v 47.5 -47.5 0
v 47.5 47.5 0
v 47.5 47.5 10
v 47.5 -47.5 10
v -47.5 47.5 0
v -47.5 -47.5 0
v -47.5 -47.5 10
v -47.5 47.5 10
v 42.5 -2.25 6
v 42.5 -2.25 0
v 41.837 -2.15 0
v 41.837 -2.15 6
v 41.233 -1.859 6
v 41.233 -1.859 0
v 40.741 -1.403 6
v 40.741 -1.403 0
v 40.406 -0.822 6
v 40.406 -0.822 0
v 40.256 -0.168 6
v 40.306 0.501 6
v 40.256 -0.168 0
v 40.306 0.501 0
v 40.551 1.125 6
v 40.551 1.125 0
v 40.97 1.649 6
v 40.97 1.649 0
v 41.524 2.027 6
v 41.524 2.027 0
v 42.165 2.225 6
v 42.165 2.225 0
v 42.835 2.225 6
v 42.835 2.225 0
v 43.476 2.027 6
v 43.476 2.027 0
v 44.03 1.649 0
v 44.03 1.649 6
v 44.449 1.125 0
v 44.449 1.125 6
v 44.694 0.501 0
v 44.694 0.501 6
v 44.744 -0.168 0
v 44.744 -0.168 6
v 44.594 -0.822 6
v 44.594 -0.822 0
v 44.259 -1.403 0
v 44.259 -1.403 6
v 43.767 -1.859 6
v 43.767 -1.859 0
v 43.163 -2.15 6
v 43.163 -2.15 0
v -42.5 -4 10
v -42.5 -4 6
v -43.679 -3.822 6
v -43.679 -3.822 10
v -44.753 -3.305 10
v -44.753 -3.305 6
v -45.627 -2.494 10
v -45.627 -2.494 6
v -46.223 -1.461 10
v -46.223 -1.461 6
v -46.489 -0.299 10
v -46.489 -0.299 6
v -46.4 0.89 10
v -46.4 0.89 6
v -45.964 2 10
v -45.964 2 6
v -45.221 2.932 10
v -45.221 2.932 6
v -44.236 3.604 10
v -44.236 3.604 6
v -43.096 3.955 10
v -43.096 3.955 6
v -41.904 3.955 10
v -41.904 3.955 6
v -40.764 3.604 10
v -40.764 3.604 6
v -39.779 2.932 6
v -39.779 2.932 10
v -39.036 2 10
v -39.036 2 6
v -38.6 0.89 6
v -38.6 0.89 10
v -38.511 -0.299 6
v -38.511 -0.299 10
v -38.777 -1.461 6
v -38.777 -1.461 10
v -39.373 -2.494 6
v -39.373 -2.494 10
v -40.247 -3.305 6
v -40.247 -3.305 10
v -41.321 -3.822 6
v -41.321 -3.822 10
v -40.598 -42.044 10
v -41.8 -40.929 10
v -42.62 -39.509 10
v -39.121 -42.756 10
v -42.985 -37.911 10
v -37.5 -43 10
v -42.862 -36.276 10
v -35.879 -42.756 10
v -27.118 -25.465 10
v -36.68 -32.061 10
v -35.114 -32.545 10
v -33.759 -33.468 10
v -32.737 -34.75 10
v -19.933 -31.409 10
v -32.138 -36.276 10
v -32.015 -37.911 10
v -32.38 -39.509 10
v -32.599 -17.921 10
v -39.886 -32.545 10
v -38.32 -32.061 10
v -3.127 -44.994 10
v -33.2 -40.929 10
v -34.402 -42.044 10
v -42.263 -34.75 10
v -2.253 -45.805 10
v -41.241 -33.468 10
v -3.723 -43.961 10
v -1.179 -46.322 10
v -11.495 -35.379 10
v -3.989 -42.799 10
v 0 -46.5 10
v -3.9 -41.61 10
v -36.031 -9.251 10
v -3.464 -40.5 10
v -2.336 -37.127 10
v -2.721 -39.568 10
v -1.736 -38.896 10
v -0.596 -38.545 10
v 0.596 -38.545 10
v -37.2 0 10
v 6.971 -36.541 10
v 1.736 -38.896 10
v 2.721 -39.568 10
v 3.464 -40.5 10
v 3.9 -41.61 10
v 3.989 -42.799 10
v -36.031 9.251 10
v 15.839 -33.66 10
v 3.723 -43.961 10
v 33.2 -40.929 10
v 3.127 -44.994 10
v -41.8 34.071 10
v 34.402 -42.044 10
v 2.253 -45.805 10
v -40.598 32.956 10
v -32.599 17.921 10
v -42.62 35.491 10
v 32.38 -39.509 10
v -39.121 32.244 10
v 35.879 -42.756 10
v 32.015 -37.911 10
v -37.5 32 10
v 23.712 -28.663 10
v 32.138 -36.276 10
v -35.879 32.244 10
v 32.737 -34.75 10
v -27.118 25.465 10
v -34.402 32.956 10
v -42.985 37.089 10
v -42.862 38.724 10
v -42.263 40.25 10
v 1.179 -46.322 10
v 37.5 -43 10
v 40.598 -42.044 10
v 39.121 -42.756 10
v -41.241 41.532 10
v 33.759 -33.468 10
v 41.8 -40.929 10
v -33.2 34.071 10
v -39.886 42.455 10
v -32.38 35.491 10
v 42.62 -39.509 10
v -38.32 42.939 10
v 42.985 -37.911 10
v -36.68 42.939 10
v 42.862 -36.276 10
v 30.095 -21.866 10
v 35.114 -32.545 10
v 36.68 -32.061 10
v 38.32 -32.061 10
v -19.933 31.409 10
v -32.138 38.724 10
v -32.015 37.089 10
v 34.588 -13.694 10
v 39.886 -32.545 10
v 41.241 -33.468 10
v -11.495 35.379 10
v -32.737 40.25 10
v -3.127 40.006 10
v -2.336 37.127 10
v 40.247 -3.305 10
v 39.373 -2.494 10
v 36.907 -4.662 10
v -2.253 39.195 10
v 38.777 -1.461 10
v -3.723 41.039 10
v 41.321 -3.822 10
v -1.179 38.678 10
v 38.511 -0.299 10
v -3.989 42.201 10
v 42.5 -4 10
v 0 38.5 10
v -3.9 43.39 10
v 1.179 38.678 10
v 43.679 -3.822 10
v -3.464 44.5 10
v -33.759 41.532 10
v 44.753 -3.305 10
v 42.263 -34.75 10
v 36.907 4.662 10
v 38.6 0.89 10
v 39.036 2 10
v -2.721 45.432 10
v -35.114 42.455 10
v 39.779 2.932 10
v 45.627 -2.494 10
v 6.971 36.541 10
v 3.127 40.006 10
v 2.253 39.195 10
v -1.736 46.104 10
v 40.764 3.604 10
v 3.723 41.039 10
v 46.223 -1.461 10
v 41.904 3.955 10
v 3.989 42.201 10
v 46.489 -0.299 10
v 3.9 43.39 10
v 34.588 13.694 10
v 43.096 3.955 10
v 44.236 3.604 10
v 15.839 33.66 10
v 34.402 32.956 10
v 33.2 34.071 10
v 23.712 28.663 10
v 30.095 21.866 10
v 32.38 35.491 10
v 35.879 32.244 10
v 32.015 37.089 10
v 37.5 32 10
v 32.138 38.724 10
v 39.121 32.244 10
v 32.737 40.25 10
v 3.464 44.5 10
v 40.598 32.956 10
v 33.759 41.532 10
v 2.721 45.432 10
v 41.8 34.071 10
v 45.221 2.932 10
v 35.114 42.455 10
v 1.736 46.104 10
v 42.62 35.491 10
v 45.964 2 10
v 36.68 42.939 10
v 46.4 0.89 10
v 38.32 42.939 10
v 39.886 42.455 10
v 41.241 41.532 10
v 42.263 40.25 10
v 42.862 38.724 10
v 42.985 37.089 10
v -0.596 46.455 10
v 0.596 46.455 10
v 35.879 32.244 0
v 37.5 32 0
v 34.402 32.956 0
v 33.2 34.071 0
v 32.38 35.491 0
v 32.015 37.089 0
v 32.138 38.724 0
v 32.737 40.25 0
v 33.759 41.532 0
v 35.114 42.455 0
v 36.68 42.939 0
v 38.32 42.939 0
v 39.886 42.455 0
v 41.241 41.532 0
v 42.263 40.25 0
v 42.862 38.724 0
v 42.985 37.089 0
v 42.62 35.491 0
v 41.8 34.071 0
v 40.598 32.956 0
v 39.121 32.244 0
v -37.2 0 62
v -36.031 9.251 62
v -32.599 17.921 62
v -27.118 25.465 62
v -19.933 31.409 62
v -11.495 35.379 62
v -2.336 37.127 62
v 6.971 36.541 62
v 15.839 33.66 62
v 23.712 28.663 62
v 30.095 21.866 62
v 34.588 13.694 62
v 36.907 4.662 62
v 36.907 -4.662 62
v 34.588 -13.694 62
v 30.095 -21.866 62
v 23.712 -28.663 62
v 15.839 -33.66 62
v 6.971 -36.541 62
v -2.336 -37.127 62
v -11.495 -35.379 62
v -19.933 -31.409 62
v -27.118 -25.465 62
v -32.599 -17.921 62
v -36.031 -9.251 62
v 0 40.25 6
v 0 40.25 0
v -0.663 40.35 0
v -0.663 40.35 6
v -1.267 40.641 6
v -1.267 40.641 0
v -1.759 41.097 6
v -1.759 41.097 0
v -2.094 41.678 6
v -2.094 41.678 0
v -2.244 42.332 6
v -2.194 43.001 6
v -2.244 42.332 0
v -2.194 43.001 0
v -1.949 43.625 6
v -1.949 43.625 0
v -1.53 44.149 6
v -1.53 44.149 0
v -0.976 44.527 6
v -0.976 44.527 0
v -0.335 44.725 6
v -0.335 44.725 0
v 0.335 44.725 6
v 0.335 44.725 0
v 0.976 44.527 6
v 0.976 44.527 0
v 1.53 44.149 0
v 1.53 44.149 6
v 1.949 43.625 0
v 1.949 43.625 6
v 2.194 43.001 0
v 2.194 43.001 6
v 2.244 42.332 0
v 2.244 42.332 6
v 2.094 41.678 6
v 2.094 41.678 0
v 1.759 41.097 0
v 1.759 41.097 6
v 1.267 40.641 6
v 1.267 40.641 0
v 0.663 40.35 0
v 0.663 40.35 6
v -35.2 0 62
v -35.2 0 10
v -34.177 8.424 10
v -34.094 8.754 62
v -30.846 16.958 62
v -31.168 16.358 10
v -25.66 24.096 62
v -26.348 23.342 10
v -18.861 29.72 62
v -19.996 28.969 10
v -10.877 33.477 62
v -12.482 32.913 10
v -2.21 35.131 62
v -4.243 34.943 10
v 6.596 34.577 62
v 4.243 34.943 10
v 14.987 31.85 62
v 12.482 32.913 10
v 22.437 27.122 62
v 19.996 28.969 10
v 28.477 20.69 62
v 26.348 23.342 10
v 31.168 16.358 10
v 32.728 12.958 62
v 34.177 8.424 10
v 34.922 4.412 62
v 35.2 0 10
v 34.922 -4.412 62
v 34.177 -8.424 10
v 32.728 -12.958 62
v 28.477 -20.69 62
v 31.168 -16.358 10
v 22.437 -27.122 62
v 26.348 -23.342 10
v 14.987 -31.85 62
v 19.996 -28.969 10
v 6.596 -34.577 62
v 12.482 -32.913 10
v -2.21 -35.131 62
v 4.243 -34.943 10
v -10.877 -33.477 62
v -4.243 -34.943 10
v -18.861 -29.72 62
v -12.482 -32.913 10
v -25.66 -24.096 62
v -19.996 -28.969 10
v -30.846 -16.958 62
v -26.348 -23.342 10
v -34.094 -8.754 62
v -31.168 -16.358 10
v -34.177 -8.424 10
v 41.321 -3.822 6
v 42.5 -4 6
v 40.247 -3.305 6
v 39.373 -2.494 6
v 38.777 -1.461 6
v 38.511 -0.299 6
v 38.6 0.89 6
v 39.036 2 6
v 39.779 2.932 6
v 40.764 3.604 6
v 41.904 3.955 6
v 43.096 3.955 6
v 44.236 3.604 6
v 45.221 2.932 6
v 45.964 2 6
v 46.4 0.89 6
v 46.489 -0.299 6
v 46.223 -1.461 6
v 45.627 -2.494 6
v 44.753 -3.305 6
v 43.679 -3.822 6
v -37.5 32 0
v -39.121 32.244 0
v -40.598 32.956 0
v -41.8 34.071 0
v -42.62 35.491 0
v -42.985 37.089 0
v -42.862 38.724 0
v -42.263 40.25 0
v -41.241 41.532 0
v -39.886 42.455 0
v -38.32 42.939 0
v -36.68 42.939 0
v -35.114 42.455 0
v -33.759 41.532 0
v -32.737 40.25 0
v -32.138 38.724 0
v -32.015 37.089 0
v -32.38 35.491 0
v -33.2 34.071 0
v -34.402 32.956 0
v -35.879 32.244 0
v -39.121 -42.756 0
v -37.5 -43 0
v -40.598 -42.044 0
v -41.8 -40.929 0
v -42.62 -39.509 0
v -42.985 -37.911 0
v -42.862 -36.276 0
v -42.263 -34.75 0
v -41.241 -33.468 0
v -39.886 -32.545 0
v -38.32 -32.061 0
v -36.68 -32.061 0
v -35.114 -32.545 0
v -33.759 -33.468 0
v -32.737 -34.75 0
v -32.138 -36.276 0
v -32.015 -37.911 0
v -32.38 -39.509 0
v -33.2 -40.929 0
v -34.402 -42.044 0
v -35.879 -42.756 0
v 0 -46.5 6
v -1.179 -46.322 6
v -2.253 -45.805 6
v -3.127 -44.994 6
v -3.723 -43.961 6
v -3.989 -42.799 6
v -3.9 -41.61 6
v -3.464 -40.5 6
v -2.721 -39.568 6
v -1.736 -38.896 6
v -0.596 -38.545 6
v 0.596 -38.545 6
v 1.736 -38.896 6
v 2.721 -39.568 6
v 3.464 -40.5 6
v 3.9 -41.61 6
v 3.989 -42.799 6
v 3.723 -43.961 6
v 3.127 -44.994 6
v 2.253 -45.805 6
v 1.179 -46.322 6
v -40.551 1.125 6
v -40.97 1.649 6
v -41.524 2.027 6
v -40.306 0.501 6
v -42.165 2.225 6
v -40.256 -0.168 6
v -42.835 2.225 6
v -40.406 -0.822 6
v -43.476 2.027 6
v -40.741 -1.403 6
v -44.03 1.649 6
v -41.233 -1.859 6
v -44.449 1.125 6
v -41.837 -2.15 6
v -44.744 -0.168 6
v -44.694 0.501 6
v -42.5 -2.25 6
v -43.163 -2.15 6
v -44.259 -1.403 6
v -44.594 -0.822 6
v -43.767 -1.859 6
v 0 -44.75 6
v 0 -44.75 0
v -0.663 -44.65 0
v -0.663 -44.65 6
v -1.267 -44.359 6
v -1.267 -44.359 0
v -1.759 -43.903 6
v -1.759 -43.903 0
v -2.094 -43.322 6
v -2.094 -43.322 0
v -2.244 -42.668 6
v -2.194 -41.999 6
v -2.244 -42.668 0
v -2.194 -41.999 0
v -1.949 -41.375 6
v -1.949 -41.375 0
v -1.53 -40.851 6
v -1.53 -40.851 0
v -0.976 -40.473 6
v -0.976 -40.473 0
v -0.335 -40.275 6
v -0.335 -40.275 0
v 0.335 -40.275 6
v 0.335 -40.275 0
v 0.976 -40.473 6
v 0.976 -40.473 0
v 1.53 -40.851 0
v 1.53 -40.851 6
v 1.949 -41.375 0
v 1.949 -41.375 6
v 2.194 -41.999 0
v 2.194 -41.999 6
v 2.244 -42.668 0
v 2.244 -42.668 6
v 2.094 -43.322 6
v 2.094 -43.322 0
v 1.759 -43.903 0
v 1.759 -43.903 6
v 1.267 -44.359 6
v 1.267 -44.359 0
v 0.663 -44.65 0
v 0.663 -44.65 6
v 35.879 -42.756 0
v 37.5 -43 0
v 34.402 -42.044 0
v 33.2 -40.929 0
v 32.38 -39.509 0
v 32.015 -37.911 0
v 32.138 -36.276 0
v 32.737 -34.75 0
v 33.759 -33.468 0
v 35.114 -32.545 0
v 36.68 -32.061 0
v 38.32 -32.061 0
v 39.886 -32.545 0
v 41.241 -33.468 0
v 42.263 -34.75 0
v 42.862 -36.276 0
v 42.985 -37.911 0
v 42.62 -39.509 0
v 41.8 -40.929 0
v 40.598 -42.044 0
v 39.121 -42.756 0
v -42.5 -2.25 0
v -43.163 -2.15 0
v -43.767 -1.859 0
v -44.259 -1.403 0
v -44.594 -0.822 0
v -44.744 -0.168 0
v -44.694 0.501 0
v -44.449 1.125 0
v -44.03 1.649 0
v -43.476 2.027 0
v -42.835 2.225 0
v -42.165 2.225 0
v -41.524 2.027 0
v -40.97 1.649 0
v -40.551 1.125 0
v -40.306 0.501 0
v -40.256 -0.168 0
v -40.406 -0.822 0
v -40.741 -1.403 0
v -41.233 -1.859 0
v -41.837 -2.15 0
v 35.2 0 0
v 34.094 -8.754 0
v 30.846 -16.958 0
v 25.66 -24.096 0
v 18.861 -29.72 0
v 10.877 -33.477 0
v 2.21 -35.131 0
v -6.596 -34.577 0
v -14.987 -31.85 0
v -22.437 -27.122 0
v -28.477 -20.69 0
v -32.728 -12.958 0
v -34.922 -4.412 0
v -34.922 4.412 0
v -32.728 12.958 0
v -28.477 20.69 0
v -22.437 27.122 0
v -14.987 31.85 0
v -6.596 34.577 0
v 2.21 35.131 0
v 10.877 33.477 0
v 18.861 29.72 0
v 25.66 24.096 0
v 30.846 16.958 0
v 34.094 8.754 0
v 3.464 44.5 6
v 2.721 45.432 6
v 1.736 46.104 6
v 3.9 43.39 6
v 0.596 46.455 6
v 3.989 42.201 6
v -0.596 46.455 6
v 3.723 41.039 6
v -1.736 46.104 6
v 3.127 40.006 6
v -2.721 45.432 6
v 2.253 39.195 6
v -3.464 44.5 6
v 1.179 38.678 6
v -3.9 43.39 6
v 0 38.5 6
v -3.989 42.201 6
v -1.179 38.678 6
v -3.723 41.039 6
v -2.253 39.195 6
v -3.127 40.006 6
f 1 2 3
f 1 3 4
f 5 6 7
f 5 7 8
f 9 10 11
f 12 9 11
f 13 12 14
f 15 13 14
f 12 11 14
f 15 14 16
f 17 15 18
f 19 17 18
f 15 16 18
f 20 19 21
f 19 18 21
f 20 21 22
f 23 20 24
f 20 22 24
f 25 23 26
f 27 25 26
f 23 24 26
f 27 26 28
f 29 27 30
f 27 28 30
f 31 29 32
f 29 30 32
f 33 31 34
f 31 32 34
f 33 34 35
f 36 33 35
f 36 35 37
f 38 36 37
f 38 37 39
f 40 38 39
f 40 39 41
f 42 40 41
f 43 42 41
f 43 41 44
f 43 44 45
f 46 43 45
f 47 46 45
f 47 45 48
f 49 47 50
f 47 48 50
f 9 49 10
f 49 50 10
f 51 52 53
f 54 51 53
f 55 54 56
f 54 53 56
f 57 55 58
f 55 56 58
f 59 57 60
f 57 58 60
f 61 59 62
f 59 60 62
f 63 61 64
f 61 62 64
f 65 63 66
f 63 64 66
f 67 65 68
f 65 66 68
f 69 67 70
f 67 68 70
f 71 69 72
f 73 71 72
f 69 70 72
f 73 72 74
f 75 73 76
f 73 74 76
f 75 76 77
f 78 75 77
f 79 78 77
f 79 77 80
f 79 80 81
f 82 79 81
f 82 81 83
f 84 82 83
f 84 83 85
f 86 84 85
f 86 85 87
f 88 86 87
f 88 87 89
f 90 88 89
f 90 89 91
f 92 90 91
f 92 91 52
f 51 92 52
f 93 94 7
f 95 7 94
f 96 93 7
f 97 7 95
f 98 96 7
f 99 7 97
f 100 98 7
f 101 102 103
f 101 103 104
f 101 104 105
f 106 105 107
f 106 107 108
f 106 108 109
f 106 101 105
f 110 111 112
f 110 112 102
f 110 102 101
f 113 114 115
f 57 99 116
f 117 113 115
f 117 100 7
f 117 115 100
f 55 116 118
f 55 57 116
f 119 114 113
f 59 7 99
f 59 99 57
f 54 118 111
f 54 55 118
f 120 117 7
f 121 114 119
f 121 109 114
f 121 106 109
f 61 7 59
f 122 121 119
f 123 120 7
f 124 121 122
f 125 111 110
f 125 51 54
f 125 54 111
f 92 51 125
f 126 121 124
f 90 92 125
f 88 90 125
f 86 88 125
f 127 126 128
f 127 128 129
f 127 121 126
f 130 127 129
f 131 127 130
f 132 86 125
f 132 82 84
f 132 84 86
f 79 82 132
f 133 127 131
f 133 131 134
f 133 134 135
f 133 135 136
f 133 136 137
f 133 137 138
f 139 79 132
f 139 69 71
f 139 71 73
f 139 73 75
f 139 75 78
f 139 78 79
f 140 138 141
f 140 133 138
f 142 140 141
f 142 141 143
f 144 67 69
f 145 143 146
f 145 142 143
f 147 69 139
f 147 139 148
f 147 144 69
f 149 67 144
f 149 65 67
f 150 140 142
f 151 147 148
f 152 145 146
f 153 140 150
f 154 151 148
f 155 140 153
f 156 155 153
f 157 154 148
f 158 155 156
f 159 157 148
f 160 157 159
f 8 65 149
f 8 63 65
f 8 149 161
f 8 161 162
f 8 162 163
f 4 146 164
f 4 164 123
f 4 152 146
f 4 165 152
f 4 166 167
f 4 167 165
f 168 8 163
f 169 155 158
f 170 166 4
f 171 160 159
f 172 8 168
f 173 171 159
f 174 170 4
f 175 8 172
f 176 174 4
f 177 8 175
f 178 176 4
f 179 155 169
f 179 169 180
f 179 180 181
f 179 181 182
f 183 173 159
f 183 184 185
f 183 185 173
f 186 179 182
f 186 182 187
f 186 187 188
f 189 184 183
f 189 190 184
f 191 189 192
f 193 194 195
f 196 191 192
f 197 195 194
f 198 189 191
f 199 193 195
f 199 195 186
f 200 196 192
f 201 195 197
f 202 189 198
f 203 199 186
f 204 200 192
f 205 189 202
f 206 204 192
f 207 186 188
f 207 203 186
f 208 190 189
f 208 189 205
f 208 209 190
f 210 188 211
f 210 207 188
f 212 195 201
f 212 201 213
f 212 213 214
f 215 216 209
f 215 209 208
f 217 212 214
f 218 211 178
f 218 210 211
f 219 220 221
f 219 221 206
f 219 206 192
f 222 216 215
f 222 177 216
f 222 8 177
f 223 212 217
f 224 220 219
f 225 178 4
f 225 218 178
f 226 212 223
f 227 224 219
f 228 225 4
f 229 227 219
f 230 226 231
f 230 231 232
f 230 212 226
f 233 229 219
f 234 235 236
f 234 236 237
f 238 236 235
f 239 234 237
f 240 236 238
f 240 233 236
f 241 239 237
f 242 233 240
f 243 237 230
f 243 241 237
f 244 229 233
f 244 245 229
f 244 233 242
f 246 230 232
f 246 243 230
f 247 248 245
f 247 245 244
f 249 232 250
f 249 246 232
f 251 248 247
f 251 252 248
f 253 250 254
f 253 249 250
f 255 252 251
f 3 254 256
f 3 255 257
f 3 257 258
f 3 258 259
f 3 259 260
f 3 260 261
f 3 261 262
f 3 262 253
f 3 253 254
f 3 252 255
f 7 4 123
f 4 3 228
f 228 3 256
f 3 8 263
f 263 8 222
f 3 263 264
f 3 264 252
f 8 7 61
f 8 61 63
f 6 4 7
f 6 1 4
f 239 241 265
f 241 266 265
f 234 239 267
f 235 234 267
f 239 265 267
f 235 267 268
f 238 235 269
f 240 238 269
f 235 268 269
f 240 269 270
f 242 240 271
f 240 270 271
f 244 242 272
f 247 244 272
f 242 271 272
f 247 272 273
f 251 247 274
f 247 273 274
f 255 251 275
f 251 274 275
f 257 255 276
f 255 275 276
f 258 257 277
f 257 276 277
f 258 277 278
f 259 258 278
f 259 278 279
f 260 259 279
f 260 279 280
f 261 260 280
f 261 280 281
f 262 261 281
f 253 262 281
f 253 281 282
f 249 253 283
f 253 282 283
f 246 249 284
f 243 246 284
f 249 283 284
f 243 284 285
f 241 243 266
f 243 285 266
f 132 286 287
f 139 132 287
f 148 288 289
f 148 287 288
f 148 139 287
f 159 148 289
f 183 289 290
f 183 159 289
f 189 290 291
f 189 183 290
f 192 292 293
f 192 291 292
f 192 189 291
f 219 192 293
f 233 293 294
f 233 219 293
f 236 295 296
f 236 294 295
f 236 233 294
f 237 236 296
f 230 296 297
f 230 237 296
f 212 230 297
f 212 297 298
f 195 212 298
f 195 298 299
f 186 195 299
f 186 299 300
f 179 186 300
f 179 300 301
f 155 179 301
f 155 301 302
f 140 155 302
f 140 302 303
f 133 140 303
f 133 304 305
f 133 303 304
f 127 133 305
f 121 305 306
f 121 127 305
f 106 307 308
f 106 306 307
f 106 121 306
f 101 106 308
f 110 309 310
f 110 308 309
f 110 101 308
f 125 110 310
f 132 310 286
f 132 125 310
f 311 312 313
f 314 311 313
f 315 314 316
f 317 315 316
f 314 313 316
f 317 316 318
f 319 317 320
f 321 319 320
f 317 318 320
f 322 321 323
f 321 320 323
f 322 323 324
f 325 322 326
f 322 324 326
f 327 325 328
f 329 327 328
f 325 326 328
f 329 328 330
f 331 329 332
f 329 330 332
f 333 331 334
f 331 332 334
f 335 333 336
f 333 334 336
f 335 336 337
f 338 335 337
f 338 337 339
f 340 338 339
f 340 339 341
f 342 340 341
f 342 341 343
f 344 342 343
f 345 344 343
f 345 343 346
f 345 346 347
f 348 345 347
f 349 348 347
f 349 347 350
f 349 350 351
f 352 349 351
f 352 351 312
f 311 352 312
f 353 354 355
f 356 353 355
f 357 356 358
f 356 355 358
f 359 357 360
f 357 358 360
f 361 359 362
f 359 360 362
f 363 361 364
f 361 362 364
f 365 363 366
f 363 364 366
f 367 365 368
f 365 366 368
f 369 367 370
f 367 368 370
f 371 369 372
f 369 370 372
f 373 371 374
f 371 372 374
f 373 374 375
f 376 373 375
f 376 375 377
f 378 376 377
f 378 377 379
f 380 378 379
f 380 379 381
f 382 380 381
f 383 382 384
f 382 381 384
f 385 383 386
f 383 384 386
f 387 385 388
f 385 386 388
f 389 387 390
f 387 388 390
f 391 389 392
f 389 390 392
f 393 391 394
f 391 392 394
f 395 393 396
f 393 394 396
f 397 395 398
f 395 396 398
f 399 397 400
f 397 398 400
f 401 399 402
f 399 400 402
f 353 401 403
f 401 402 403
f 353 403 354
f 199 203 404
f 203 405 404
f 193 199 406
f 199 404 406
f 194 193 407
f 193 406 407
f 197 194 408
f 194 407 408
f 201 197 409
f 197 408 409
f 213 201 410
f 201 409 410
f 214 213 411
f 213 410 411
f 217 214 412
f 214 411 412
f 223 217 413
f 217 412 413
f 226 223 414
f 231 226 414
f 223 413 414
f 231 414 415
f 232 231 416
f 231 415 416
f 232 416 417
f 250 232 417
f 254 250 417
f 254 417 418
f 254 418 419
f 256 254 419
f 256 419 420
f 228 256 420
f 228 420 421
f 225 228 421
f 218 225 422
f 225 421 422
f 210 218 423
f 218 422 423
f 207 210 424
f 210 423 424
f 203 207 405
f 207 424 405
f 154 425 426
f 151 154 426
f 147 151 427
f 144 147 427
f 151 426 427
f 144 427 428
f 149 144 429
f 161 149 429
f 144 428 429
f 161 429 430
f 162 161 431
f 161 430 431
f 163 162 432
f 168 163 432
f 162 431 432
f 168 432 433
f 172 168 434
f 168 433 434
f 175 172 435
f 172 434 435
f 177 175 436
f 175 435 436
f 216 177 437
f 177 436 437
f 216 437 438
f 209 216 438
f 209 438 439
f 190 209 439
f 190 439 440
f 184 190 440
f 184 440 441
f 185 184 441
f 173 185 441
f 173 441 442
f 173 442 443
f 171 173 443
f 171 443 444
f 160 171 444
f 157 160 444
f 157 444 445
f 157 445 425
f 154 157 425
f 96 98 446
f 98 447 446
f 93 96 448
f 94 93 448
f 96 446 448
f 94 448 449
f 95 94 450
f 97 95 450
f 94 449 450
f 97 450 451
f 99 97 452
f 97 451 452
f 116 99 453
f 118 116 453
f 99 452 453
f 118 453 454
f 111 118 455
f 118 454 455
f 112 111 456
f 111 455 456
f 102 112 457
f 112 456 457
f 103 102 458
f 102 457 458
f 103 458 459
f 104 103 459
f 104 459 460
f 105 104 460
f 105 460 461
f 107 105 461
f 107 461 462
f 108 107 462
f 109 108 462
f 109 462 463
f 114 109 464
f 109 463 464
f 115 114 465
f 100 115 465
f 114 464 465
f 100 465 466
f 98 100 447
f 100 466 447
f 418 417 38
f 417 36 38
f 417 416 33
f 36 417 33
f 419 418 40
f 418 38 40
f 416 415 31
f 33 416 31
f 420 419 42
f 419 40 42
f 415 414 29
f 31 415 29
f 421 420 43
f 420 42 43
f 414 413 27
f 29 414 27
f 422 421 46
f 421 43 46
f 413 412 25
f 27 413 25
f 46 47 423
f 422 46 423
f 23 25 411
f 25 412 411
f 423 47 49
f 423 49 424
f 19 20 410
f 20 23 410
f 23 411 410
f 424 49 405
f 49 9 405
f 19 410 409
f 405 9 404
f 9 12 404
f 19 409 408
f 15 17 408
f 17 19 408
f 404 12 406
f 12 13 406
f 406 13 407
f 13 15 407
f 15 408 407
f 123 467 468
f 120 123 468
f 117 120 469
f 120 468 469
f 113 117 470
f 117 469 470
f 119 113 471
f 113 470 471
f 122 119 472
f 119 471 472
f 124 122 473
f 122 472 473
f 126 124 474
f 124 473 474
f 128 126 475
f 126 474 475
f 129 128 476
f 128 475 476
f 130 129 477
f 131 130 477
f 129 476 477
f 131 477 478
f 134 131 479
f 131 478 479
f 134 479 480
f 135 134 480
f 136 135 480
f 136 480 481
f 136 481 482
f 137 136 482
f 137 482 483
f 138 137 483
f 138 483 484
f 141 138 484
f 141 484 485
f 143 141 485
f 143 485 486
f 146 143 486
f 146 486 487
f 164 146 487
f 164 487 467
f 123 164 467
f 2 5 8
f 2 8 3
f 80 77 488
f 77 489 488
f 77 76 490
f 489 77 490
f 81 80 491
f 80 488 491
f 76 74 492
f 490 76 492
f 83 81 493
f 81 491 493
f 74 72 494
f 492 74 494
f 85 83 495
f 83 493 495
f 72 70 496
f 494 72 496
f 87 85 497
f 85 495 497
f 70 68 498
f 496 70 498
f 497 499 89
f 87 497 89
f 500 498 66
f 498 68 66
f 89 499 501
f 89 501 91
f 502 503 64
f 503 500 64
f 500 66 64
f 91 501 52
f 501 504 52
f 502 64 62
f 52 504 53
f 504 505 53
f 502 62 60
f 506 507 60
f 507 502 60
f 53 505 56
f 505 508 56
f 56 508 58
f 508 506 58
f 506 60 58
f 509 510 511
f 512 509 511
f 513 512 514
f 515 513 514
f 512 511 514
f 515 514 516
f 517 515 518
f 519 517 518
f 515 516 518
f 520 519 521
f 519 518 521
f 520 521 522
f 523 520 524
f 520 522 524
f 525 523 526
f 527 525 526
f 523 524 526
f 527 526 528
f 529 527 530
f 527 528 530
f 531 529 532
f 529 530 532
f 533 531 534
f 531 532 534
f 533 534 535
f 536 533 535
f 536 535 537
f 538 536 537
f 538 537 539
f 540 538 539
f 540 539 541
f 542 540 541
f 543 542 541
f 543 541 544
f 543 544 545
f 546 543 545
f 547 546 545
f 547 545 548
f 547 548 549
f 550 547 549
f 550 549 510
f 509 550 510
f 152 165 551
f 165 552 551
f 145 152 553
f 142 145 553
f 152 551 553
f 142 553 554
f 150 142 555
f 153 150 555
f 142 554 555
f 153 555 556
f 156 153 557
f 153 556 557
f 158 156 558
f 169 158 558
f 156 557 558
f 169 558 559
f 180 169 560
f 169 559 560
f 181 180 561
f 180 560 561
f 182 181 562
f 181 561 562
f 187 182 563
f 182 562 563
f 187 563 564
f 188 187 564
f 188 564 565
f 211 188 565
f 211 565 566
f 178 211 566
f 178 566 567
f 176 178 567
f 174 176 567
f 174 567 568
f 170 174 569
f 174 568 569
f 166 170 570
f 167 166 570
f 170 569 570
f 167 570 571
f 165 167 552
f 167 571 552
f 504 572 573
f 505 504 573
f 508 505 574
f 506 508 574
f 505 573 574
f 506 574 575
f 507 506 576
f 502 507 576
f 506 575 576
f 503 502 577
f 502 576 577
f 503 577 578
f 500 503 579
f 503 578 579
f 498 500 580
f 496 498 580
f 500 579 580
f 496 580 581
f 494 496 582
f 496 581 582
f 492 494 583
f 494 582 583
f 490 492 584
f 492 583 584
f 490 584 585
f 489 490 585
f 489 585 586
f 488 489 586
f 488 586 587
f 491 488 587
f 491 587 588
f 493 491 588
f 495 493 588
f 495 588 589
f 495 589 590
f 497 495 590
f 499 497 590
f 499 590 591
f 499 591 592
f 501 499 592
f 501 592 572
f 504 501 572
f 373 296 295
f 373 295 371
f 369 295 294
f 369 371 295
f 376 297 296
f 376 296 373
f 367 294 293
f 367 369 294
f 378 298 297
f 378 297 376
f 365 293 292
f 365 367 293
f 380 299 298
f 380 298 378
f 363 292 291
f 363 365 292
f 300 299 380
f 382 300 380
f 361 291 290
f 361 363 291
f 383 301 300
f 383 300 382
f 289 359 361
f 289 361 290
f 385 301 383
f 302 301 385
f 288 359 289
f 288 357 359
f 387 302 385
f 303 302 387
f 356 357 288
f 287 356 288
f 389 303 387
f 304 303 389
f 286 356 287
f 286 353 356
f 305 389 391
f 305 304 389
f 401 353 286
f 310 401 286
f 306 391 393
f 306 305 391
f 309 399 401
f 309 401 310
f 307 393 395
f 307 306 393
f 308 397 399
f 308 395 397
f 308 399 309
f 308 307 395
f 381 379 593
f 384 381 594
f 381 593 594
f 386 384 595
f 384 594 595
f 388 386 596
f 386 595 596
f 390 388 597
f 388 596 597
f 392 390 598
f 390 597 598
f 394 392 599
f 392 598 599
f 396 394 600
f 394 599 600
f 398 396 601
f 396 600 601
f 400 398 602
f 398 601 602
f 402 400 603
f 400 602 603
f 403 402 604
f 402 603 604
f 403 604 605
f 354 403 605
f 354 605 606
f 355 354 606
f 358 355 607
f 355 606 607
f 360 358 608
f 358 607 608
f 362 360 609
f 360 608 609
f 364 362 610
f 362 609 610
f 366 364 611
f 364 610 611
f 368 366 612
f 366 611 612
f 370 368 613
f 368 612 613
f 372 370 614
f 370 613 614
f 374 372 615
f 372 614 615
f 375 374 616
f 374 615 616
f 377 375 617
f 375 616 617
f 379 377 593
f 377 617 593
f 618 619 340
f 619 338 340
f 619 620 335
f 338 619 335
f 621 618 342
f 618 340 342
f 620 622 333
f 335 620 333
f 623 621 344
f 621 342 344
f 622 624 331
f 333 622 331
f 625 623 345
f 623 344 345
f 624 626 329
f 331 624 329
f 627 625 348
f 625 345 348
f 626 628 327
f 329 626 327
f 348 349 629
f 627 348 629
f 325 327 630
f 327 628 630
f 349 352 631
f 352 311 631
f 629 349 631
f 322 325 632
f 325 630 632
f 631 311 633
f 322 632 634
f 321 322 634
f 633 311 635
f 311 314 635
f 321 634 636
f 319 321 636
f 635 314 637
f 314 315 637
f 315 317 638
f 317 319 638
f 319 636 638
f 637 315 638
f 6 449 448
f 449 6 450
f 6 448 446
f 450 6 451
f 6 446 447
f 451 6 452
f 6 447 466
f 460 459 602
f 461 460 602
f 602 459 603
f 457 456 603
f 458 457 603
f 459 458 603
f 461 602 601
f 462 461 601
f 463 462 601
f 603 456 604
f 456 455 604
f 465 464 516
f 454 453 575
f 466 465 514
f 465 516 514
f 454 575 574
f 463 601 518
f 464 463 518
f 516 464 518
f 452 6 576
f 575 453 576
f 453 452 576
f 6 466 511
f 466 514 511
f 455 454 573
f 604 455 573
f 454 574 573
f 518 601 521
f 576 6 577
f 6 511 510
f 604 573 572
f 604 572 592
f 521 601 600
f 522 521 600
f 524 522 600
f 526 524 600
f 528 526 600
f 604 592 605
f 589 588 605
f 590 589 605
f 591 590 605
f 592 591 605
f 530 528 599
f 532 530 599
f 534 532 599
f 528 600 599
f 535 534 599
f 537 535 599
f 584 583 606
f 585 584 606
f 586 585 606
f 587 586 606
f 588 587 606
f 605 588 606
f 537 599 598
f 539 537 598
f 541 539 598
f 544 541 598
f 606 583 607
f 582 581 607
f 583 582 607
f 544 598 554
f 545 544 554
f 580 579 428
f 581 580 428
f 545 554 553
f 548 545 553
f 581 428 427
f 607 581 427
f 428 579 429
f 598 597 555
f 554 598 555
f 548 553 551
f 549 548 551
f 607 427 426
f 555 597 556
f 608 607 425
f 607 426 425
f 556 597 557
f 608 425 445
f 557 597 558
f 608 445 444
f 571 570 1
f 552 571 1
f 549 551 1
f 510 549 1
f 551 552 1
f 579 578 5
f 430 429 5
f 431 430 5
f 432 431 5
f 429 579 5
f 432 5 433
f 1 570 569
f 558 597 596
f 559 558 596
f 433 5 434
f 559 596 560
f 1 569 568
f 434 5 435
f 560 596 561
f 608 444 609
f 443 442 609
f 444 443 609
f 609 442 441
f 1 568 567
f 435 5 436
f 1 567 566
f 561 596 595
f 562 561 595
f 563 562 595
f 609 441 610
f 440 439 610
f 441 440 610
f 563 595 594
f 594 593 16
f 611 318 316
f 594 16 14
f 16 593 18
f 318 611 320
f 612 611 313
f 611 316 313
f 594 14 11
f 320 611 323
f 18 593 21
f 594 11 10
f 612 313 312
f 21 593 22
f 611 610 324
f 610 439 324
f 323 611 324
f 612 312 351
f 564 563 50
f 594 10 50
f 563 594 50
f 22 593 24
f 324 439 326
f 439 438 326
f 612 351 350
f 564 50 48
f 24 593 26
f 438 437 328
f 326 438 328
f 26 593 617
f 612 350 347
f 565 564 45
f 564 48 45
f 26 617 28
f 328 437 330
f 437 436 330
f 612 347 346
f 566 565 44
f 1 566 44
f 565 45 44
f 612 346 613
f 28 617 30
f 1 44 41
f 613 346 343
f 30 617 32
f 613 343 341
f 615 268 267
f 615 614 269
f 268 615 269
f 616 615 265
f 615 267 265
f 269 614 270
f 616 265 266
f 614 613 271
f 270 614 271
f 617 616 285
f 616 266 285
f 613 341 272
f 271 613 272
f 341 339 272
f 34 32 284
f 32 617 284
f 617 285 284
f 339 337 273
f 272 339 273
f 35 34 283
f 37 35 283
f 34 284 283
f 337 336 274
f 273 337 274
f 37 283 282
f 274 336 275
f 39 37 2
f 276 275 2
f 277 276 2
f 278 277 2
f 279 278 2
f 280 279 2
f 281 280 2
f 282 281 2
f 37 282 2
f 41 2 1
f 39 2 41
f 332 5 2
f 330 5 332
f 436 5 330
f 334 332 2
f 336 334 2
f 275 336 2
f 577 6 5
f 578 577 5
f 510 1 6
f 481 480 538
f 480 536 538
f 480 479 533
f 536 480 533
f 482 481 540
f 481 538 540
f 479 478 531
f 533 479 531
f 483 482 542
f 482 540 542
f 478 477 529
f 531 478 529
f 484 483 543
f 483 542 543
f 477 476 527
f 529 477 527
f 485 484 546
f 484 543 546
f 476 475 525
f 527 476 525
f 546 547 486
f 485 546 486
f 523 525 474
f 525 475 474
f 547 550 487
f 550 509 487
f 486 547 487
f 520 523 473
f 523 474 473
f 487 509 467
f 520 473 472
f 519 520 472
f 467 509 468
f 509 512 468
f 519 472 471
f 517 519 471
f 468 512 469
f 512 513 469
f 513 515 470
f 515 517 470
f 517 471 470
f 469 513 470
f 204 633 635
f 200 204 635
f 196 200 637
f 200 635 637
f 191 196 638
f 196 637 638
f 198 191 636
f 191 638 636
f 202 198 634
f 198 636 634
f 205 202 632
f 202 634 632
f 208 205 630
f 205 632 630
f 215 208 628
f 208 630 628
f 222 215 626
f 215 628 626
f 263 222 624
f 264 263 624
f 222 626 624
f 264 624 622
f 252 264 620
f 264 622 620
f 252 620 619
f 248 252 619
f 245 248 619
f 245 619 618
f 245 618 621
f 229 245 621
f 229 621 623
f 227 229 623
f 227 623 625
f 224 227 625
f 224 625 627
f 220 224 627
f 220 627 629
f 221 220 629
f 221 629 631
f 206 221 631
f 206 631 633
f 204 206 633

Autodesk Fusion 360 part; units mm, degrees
sketch "Sketch1" plane through (0, 0, 0) normal (0, 0, 1) x (1, 0, 0)
  line L0 (-47.5, 47.5) -> (47.5, 47.5)
  line L1 (47.5, 47.5) -> (47.5, -47.5)
  line L2 (47.5, -47.5) -> (-47.5, -47.5)
  line L3 (-47.5, -47.5) -> (-47.5, 47.5)
  line L4 (-47.5, 47.5) -> (47.5, -47.5) construction
  line L5 (-47.5, -47.5) -> (47.5, 47.5) construction
  circle A0 centre (0, 0) radius 35.2
  dimension "d1" = 95
  dimension "d2" = 95
  dimension "d3" = 70.4
extrude "Extrude1" add sketch "Sketch1" along normal blind 10
sketch "Sketch2" plane through (0, 0, 10) normal (0, 0, 1) x (-1, 0, 0)
  circle A0 centre (0, 0) radius 35.2
  line L0 (47.5, 47.5) -> (-47.5, 47.5)
  line L1 (-47.5, 47.5) -> (-47.5, -47.5)
  line L2 (-47.5, -47.5) -> (47.5, -47.5)
  line L3 (47.5, -47.5) -> (47.5, 47.5)
  line L4 (42.5, 0) -> (-42.5, 0) construction
  line L5 (0, -42.5) -> (0, 42.5) construction
  point P0 (0, -42.5)
  point P1 (42.5, 0)
  point P2 (0, 42.5)
  point P3 (-42.5, 0)
  dimension "d7" = 5
  dimension "d8" = 5
  dimension "d9" = 5
  dimension "d10" = 5
hole "Hole1" at (-42.5, 0, 10) at (0, 42.5, 10) at (42.5, 0, 10) at (0, -42.5, 10) direction (0, 0, -1) diameter 4.5 depth 15 tip angle 118 counterbore diameter 8 counterbore depth 4
sketch "Sketch3" plane through (0, 0, 10) normal (0, 0, 1) x (-1, 0, 0)
  circle A0 centre (-42.5, 0) radius 4
  circle A1 centre (42.5, 0) radius 4
  circle A2 centre (0, -42.5) radius 4
  circle A3 centre (0, 42.5) radius 4
  circle A4 centre (0, 0) radius 35.2
  line L0 (47.5, 47.5) -> (-47.5, 47.5)
  line L1 (-47.5, 47.5) -> (-47.5, -47.5)
  line L2 (-47.5, -47.5) -> (47.5, -47.5)
  line L3 (47.5, -47.5) -> (47.5, 47.5)
  circle A5 centre (0, 0) radius 35.2
  circle A6 centre (0, 0) radius 37.2
  dimension "d16" = 2
extrude "Extrude2" add sketch "Sketch3" along normal blind 52 contours A6
sketch "Sketch4" plane through (0, 0, 10) normal (0, 0, 1) x (-1, 0, 0)
  circle A0 centre (0, 0) radius 37.2
  circle A1 centre (-42.5, 0) radius 4
  circle A2 centre (42.5, 0) radius 4
  circle A3 centre (0, -42.5) radius 4
  circle A4 centre (0, 42.5) radius 4
  line L0 (47.5, 47.5) -> (-47.5, 47.5)
  line L1 (-47.5, 47.5) -> (-47.5, -47.5)
  line L2 (-47.5, -47.5) -> (47.5, -47.5)
  line L3 (47.5, -47.5) -> (47.5, 47.5)
  line L4 (37.5, -37.5) -> (-37.5, -37.5) construction
  line L5 (-37.5, -37.5) -> (-37.5, 37.5) construction
  line L6 (-37.5, 37.5) -> (37.5, 37.5) construction
  line L7 (37.5, 37.5) -> (37.5, -37.5) construction
  point P0 (37.5, -37.5)
  point P1 (-37.5, -37.5)
  point P2 (-37.5, 37.5)
  point P3 (37.5, 37.5)
  dimension "d19" = 10
  dimension "d20" = 10
  dimension "d21" = 10
  dimension "d22" = 10
hole "Hole2" at (-37.5, -37.5, 10) at (-37.5, 37.5, 10) at (37.5, 37.5, 10) at (37.5, -37.5, 10) direction (0, 0, -1) diameter 11 end through all
equation "d2 = d1"
equation "d8 = d7"
equation "d9 = d7"
equation "d10 = d7"
equation "d20 = d19"
equation "d21 = d19"
equation "d22 = d19"
